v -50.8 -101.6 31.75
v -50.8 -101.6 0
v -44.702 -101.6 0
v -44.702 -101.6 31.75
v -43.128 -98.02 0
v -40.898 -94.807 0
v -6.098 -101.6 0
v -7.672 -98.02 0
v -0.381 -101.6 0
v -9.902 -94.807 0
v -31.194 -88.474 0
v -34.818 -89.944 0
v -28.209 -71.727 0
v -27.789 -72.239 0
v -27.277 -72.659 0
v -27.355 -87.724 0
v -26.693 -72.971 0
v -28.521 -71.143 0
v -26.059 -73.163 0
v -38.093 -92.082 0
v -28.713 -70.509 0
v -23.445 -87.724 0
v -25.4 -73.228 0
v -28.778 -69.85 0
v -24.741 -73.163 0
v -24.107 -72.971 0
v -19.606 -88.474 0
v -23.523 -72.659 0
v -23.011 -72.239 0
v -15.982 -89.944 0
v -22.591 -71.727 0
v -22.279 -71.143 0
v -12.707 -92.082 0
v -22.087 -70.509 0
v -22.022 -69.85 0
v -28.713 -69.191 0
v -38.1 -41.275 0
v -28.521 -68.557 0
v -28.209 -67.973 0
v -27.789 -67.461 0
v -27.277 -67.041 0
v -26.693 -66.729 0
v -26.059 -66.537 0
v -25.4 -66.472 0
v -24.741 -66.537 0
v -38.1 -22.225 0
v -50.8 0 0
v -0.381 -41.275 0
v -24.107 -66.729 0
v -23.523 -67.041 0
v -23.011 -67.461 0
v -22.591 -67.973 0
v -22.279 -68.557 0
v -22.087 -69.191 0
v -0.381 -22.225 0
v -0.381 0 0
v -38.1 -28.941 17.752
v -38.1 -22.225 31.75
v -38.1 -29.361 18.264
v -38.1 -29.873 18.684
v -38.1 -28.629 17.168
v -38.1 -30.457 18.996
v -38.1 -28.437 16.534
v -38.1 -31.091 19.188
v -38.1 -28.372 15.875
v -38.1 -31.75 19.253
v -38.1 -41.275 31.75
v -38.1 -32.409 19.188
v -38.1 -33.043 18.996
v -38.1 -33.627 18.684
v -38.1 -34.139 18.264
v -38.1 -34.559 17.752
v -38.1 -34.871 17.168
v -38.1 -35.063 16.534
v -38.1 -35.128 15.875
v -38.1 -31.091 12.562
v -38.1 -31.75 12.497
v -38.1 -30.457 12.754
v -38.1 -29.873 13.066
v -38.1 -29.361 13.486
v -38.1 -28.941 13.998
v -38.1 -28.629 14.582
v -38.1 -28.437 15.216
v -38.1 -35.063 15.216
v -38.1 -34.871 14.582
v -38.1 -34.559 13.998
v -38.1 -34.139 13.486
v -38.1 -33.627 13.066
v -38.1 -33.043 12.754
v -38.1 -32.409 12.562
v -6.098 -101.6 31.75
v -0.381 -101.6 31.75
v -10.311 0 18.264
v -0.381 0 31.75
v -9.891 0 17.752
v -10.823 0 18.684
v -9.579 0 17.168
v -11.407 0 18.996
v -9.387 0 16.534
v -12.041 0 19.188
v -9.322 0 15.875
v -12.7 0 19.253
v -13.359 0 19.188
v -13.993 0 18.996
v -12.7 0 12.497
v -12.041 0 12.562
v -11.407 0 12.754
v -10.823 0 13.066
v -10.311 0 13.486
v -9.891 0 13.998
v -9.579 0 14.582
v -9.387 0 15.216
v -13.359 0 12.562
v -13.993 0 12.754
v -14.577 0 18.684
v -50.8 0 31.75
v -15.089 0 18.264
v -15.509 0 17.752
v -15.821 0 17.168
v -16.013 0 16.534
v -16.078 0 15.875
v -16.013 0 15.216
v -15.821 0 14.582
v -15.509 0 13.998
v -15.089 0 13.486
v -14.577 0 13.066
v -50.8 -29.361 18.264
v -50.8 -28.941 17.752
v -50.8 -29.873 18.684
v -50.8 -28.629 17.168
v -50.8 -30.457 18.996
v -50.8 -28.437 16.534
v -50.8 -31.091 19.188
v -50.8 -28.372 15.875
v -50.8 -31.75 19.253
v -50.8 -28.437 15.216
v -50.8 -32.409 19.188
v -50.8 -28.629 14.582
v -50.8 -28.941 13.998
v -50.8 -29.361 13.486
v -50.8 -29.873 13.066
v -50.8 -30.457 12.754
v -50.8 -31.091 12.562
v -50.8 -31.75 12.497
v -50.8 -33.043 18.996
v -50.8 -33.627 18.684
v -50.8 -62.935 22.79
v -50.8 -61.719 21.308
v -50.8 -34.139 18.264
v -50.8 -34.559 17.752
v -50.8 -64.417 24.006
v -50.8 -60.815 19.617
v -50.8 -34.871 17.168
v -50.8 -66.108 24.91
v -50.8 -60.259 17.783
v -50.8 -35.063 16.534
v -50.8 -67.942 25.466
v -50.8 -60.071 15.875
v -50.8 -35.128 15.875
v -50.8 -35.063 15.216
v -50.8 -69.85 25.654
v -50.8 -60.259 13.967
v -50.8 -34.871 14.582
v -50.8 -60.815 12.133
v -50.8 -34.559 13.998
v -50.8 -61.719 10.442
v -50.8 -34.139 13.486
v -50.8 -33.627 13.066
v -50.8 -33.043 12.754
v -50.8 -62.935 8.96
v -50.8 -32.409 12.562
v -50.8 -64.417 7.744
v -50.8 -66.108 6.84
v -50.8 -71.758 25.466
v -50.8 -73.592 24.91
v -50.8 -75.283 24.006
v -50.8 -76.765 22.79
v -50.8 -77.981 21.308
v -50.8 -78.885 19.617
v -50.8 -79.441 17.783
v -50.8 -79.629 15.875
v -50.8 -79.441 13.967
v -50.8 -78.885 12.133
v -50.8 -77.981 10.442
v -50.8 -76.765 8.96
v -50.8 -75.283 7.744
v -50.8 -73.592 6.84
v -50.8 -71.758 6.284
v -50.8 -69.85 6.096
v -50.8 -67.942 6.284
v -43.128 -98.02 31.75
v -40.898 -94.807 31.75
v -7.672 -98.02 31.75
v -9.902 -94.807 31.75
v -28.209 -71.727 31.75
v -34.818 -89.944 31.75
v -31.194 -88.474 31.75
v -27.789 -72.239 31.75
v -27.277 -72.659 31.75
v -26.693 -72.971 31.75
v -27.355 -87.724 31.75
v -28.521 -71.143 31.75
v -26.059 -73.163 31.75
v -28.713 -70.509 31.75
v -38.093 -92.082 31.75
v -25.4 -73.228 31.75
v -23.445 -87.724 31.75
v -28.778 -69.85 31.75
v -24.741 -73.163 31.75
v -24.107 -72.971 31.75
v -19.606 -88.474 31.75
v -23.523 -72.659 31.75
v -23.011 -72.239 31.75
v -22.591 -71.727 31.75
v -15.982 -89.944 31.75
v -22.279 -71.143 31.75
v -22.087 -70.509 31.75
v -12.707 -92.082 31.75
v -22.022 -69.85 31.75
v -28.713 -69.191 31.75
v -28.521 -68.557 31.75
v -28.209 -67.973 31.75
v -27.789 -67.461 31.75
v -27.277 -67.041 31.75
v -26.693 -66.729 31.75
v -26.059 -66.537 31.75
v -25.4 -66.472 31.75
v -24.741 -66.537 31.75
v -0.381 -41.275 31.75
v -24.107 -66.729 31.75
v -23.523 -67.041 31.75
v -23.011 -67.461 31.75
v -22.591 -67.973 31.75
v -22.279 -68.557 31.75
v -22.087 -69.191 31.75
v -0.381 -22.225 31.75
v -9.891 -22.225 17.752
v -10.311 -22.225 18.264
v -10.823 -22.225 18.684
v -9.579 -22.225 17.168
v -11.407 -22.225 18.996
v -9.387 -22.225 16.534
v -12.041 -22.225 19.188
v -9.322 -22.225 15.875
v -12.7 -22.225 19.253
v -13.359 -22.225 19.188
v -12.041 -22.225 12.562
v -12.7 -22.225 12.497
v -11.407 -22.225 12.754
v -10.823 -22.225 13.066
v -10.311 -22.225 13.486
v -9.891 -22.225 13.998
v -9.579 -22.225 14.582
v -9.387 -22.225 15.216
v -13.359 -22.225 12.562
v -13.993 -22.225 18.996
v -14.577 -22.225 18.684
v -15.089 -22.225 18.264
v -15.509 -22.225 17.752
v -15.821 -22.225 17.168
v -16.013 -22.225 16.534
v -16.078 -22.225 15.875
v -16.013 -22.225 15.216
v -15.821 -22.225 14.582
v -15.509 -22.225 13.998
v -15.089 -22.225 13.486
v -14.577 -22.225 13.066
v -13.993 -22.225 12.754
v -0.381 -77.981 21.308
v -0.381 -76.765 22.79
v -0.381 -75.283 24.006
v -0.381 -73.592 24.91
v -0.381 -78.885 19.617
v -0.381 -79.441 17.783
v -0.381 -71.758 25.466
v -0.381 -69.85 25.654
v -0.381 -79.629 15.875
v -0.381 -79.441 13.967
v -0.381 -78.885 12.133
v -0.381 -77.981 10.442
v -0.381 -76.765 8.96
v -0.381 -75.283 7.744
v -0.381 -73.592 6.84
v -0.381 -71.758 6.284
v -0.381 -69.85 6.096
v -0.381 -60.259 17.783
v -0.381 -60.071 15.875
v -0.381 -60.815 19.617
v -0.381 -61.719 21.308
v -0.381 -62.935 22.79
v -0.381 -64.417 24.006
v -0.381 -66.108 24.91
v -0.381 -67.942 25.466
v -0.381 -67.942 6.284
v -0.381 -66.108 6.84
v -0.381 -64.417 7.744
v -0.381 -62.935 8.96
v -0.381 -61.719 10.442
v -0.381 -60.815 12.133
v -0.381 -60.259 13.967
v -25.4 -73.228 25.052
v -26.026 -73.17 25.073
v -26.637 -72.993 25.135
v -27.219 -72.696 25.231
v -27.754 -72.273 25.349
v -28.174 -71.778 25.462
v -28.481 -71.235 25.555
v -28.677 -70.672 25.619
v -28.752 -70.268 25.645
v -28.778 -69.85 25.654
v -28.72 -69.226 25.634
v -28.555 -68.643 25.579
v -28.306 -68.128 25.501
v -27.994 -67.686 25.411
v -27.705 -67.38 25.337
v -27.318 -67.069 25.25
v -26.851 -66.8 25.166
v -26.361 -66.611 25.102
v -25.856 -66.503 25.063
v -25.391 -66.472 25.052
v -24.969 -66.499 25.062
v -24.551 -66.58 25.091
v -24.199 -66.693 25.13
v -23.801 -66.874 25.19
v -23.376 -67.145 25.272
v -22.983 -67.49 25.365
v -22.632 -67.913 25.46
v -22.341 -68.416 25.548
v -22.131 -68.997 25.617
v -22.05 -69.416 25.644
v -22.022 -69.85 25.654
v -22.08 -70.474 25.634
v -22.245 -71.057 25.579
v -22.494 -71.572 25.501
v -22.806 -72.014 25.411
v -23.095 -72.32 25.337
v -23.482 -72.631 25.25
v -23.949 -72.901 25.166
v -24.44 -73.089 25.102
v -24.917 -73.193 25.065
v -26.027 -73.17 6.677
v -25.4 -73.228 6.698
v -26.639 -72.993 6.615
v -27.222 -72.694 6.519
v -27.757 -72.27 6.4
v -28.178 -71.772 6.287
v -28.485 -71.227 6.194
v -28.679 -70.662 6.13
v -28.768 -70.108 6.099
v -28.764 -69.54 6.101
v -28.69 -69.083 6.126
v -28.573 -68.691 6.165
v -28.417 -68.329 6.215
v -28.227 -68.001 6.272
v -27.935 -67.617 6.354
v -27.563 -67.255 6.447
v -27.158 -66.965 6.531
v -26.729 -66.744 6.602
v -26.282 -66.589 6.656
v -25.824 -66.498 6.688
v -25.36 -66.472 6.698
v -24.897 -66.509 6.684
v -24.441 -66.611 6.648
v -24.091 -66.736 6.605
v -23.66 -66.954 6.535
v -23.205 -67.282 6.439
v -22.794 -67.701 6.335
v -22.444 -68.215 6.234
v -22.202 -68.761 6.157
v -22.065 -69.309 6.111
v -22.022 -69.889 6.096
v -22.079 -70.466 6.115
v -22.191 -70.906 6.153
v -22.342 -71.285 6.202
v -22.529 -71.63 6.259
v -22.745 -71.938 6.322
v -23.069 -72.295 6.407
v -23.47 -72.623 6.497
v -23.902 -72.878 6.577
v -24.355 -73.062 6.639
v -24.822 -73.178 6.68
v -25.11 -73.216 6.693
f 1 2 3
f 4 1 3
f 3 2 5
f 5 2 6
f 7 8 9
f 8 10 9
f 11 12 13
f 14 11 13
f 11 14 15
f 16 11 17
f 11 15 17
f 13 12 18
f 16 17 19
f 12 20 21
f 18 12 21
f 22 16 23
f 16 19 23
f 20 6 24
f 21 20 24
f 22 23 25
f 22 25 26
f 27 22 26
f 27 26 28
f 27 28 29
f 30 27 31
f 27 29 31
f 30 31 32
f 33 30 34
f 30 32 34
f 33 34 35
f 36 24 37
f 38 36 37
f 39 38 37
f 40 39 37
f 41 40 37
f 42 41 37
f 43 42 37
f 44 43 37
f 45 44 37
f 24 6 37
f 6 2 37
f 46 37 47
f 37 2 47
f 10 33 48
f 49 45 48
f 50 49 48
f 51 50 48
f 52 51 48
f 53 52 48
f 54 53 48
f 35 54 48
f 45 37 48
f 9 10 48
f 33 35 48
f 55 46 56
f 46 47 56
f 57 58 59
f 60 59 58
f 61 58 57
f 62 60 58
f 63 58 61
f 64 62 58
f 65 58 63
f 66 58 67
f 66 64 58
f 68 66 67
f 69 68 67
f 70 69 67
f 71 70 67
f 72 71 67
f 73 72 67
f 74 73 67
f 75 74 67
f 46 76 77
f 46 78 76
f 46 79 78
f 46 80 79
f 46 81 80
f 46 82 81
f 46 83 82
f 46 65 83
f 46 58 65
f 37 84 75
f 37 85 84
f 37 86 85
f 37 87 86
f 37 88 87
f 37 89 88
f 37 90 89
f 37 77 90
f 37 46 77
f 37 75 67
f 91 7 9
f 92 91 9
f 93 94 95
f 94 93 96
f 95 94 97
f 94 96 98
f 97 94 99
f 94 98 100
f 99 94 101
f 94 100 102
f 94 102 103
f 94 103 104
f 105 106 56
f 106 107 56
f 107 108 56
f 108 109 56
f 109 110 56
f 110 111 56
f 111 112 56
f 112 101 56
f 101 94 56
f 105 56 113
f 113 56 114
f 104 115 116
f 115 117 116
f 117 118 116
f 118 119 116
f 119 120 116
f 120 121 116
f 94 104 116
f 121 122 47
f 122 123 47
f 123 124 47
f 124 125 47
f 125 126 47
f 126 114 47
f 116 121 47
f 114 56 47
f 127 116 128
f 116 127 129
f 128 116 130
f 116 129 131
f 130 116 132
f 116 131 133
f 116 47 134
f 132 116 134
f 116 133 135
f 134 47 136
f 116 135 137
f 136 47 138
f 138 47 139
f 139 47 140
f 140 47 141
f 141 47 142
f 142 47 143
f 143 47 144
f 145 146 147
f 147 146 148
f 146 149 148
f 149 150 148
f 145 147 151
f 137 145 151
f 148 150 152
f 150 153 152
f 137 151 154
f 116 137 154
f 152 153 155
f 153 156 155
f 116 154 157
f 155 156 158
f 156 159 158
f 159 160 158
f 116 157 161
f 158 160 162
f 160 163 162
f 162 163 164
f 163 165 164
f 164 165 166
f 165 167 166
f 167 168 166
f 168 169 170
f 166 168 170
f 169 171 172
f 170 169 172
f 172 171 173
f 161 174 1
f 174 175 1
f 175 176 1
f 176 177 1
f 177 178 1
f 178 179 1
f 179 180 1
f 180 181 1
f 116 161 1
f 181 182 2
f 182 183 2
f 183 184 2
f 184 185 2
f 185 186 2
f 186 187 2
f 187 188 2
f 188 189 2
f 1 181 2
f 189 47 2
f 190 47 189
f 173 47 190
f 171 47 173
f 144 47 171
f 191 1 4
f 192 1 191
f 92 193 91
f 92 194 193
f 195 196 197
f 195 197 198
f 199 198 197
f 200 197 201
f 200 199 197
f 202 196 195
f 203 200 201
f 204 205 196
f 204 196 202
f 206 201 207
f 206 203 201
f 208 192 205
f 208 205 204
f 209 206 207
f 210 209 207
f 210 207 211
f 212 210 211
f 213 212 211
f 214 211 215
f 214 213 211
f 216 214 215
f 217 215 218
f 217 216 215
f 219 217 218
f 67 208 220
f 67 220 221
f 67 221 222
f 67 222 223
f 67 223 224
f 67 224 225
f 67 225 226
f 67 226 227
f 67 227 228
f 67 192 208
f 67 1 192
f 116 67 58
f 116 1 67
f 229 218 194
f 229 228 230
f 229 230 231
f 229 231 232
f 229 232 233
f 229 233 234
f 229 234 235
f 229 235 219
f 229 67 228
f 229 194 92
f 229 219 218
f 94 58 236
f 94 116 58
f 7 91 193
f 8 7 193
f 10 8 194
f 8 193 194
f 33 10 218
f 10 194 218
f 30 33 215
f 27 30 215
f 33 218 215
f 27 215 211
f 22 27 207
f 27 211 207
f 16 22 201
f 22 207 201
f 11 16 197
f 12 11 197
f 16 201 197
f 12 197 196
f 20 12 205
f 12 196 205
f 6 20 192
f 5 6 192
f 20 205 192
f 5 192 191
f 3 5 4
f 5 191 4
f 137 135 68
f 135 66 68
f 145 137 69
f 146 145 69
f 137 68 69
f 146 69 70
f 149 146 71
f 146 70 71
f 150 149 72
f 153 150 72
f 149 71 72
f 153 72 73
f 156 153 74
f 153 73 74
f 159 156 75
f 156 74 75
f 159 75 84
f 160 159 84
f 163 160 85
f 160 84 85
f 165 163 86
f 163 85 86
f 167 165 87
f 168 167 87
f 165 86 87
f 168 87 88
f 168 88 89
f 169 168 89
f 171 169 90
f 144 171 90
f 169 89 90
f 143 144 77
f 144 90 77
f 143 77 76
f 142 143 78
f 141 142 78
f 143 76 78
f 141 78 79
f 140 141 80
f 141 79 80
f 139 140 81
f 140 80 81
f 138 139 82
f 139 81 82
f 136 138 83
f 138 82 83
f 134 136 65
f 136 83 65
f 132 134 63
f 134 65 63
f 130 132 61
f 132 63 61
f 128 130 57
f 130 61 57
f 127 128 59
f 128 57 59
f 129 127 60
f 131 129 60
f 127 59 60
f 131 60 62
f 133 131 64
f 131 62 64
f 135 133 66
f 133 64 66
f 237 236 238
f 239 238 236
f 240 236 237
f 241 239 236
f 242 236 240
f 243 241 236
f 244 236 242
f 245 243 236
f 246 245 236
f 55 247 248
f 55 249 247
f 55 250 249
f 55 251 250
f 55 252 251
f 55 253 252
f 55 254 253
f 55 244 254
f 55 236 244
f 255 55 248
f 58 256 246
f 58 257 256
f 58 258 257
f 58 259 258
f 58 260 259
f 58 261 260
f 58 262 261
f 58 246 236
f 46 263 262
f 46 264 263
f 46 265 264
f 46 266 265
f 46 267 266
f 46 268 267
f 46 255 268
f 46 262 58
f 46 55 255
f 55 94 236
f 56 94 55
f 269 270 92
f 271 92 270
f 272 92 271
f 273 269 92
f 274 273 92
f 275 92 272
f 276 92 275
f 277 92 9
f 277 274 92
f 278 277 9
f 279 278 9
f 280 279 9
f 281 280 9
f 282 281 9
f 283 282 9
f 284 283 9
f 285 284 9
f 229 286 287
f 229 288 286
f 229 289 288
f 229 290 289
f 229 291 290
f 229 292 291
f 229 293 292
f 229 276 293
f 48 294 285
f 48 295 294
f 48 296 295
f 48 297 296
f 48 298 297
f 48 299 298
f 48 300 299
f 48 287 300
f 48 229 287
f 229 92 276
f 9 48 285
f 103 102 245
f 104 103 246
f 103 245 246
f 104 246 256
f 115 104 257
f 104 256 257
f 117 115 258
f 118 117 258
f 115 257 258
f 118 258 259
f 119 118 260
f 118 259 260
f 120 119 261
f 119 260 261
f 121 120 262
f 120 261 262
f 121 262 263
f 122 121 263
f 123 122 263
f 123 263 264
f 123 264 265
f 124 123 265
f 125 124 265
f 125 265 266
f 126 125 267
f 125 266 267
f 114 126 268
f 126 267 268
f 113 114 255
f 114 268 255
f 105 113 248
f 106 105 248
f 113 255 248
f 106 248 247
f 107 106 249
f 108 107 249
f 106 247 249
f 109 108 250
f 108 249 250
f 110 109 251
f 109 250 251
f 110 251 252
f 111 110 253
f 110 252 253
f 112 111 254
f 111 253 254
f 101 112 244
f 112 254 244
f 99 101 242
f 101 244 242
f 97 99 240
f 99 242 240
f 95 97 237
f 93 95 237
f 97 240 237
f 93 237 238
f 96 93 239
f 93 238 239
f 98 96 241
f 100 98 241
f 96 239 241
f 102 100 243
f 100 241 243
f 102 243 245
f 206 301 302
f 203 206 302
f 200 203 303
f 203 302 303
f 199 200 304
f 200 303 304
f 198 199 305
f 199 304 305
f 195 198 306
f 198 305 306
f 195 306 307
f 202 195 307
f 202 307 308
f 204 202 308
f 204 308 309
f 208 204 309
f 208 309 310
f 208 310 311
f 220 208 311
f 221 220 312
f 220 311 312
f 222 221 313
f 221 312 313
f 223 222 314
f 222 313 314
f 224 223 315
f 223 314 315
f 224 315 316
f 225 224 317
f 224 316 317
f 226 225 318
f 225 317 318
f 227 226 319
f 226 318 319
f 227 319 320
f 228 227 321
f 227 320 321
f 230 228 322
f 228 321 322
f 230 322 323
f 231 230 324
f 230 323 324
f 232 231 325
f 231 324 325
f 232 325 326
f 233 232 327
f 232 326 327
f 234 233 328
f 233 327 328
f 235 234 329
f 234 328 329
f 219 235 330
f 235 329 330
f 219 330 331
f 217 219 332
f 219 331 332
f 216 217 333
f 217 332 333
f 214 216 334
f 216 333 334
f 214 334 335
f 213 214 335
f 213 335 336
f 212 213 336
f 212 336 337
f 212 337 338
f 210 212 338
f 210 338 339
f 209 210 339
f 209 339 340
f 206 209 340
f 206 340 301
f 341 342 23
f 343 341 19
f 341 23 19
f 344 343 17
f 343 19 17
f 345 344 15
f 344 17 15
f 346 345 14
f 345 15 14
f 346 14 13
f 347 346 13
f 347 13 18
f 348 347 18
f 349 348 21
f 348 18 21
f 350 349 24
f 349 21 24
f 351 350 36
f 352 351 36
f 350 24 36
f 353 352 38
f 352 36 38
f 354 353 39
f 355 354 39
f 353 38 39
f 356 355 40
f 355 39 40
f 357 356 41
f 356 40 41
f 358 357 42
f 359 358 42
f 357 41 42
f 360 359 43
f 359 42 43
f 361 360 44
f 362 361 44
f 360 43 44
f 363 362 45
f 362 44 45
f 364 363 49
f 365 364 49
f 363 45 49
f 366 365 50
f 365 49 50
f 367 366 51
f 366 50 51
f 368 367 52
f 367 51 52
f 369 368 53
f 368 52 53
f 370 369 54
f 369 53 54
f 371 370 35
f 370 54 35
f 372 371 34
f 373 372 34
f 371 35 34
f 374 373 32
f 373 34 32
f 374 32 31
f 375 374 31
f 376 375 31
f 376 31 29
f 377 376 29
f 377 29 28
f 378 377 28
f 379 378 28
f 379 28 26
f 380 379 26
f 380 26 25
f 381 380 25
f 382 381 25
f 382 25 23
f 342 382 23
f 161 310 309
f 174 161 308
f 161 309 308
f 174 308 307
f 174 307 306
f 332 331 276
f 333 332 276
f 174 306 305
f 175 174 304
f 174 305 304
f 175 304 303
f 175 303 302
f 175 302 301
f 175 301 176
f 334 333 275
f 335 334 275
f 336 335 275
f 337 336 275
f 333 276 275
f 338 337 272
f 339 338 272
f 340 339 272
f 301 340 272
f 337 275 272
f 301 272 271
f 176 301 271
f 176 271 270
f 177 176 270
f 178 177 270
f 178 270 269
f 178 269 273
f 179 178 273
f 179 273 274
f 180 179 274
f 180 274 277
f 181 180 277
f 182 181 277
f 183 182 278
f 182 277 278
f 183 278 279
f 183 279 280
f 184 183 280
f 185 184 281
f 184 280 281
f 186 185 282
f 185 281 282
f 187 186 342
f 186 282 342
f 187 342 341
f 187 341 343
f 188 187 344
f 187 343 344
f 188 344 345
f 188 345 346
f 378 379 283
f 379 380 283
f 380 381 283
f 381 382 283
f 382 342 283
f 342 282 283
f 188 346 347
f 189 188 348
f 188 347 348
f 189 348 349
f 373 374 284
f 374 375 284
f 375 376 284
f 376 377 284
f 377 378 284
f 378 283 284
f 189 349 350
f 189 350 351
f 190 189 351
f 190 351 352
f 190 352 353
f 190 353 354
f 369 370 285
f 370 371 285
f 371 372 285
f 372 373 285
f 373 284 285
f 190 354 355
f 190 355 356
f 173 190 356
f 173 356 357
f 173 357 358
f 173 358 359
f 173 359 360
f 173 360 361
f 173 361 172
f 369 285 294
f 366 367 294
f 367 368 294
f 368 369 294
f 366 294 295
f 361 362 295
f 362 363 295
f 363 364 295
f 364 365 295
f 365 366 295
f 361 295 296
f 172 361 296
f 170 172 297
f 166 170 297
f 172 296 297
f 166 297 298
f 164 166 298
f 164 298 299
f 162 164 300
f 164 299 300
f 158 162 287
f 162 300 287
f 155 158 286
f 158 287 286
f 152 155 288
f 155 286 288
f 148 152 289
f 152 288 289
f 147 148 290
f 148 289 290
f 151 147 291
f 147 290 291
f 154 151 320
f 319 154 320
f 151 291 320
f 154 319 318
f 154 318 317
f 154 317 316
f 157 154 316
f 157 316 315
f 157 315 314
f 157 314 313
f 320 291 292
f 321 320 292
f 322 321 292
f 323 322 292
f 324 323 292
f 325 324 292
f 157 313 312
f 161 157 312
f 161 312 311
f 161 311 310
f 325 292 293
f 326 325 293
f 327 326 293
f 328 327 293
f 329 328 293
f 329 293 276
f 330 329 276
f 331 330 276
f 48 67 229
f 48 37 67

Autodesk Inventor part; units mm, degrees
ref_plane "YZ Plane" through (0, 0, 0) normal (1, 0, 0) x (0, 1, 0)
ref_plane "XZ Plane" through (0, 0, 0) normal (0, 1, 0) x (-1, 0, 0)
ref_plane "XY Plane" through (0, 0, 0) normal (0, 0, 1) x (1, 0, 0)
sketch "Sketch1" plane through (0, 0, 0) normal (0, 0, 1) x (1, 0, 0)
  line L0 (0, 0) -> (-50.8, 0)
  line L1 (-50.8, 0) -> (-50.8, -101.6)
  line L2 (-50.8, -101.6) -> (0, -101.6)
  line L3 (0, -22.225) -> (-38.1, -22.225)
  line L4 (-38.1, -22.225) -> (-38.1, -41.275)
  line L5 (-38.1, -41.275) -> (0, -41.275)
  line L6 (0, -101.6) -> (0, -41.275)
  line L7 (0, -22.225) -> (0, 0)
  dimension "d0" = 101.6
  dimension "d1" = 50.8
  dimension "d4" = 22.225
  dimension "d5" = 38.1
  dimension "d6" = 19.05
extrude "Extrusion1" add sketch "Sketch1" along normal blind 31.75
sketch "Sketch2" plane through (0, -22.225, 0) normal (1, 0, 0) x (0, 0, -1)
  line L0 (-31.75, 0) -> (-31.75, 22.225) projected
  line L1 (0, 22.225) -> (0, -79.375) projected
  line L2 (-31.75, 22.225) -> (0, 22.225)
  line L3 (0, 22.225) -> (0, -79.375)
  line L4 (0, -79.375) -> (-31.75, -79.375)
  line L5 (-31.75, -79.375) -> (-31.75, 22.225)
extrude "Extrusion2" cut sketch "Sketch2" against normal blind 0.381
sketch "Sketch3" plane through (-50.8, 0, 31.75) normal (0, 1, 0) x (1, 0, 0)
  line L0 (0, 31.75) -> (0, 0) projected
  line L1 (50.419, 31.75) -> (0, 31.75) projected
  point P0 (50.8, 31.75)
  point P1 (38.1, 15.875)
  dimension "d9" = 38.1
  dimension "d10" = 15.875
hole "Hole1" at (-12.7, 0, 15.875) direction (0, -1, 0) diameter 6.7564 end up to surface clearance for "Flat Head Machine Screw (82)" size "1/4" standard "Ansi Unified Screw Threads"
sketch "Sketch4" plane through (-50.8, -101.6, 0) normal (-1, 0, 0) x (0, 0, 1)
  line L0 (0, 101.6) -> (0, 0) projected
  line L1 (0, 101.6) -> (31.75, 101.6) projected
  point P0 (15.875, 69.85)
  dimension "d18" = 15.875
  dimension "d19" = 31.75
hole "Hole2" at (-50.8, -31.75, 15.875) direction (1, 0, 0) diameter 6.7564 end through all clearance for "Hex Head Bolt" size "1/4" standard "Ansi Unified Screw Threads"
sketch "Sketch5" plane through (-50.8, -101.6, 0) normal (-1, 0, 0) x (0, 0, 1)
  line L0 (0, 101.6) -> (0, 0) projected
  line L1 (0, 101.6) -> (31.75, 101.6) projected
  point P0 (15.875, 31.75)
  dimension "d27" = 15.875
  dimension "d28" = 69.85
hole "Hole3" at (-50.8, -69.85, 15.875) direction (1, 0, 0) diameter 19.558 end through all
sketch "Sketch6" plane through (0, 0, 31.75) normal (0, 0, 1) x (1, 0, 0)
  line L0 (-0.381, 0) -> (-50.8, 0) projected
  line L1 (-50.8, 0) -> (-50.8, -101.6) projected
  point P0 (0, 0)
  point P1 (-25.4, -69.85)
  dimension "d36" = 69.85
  dimension "d37" = 25.4
hole "Hole4" at (-25.4, -69.85, 31.75) direction (0, 0, -1) diameter 6.7564 end through all clearance for "Hex Head Bolt" size "1/4" standard "Ansi Unified Screw Threads"
sketch "Sketch7" plane through (0, 0, 31.75) normal (0, 0, 1) x (1, 0, 0)
  circle A0 centre (-25.4, -107.95) radius 20.32
  line L0 (-0.381, 0) -> (-50.8, 0) projected
  line L1 (-50.8, 0) -> (-50.8, -101.6) projected
  point P0 (0, 0)
  dimension "d45" = 107.95
  dimension "d46" = 25.4
  dimension "d47" = 40.64
extrude "Extrusion3" cut sketch "Sketch7" against normal through all
equation "\"d10\" = 0.5 * width"
equation "\"d18\" = 0.5 * width"
equation "\"width\" = 31.75"
properties part number "Over Support For Arm With Delrin"
